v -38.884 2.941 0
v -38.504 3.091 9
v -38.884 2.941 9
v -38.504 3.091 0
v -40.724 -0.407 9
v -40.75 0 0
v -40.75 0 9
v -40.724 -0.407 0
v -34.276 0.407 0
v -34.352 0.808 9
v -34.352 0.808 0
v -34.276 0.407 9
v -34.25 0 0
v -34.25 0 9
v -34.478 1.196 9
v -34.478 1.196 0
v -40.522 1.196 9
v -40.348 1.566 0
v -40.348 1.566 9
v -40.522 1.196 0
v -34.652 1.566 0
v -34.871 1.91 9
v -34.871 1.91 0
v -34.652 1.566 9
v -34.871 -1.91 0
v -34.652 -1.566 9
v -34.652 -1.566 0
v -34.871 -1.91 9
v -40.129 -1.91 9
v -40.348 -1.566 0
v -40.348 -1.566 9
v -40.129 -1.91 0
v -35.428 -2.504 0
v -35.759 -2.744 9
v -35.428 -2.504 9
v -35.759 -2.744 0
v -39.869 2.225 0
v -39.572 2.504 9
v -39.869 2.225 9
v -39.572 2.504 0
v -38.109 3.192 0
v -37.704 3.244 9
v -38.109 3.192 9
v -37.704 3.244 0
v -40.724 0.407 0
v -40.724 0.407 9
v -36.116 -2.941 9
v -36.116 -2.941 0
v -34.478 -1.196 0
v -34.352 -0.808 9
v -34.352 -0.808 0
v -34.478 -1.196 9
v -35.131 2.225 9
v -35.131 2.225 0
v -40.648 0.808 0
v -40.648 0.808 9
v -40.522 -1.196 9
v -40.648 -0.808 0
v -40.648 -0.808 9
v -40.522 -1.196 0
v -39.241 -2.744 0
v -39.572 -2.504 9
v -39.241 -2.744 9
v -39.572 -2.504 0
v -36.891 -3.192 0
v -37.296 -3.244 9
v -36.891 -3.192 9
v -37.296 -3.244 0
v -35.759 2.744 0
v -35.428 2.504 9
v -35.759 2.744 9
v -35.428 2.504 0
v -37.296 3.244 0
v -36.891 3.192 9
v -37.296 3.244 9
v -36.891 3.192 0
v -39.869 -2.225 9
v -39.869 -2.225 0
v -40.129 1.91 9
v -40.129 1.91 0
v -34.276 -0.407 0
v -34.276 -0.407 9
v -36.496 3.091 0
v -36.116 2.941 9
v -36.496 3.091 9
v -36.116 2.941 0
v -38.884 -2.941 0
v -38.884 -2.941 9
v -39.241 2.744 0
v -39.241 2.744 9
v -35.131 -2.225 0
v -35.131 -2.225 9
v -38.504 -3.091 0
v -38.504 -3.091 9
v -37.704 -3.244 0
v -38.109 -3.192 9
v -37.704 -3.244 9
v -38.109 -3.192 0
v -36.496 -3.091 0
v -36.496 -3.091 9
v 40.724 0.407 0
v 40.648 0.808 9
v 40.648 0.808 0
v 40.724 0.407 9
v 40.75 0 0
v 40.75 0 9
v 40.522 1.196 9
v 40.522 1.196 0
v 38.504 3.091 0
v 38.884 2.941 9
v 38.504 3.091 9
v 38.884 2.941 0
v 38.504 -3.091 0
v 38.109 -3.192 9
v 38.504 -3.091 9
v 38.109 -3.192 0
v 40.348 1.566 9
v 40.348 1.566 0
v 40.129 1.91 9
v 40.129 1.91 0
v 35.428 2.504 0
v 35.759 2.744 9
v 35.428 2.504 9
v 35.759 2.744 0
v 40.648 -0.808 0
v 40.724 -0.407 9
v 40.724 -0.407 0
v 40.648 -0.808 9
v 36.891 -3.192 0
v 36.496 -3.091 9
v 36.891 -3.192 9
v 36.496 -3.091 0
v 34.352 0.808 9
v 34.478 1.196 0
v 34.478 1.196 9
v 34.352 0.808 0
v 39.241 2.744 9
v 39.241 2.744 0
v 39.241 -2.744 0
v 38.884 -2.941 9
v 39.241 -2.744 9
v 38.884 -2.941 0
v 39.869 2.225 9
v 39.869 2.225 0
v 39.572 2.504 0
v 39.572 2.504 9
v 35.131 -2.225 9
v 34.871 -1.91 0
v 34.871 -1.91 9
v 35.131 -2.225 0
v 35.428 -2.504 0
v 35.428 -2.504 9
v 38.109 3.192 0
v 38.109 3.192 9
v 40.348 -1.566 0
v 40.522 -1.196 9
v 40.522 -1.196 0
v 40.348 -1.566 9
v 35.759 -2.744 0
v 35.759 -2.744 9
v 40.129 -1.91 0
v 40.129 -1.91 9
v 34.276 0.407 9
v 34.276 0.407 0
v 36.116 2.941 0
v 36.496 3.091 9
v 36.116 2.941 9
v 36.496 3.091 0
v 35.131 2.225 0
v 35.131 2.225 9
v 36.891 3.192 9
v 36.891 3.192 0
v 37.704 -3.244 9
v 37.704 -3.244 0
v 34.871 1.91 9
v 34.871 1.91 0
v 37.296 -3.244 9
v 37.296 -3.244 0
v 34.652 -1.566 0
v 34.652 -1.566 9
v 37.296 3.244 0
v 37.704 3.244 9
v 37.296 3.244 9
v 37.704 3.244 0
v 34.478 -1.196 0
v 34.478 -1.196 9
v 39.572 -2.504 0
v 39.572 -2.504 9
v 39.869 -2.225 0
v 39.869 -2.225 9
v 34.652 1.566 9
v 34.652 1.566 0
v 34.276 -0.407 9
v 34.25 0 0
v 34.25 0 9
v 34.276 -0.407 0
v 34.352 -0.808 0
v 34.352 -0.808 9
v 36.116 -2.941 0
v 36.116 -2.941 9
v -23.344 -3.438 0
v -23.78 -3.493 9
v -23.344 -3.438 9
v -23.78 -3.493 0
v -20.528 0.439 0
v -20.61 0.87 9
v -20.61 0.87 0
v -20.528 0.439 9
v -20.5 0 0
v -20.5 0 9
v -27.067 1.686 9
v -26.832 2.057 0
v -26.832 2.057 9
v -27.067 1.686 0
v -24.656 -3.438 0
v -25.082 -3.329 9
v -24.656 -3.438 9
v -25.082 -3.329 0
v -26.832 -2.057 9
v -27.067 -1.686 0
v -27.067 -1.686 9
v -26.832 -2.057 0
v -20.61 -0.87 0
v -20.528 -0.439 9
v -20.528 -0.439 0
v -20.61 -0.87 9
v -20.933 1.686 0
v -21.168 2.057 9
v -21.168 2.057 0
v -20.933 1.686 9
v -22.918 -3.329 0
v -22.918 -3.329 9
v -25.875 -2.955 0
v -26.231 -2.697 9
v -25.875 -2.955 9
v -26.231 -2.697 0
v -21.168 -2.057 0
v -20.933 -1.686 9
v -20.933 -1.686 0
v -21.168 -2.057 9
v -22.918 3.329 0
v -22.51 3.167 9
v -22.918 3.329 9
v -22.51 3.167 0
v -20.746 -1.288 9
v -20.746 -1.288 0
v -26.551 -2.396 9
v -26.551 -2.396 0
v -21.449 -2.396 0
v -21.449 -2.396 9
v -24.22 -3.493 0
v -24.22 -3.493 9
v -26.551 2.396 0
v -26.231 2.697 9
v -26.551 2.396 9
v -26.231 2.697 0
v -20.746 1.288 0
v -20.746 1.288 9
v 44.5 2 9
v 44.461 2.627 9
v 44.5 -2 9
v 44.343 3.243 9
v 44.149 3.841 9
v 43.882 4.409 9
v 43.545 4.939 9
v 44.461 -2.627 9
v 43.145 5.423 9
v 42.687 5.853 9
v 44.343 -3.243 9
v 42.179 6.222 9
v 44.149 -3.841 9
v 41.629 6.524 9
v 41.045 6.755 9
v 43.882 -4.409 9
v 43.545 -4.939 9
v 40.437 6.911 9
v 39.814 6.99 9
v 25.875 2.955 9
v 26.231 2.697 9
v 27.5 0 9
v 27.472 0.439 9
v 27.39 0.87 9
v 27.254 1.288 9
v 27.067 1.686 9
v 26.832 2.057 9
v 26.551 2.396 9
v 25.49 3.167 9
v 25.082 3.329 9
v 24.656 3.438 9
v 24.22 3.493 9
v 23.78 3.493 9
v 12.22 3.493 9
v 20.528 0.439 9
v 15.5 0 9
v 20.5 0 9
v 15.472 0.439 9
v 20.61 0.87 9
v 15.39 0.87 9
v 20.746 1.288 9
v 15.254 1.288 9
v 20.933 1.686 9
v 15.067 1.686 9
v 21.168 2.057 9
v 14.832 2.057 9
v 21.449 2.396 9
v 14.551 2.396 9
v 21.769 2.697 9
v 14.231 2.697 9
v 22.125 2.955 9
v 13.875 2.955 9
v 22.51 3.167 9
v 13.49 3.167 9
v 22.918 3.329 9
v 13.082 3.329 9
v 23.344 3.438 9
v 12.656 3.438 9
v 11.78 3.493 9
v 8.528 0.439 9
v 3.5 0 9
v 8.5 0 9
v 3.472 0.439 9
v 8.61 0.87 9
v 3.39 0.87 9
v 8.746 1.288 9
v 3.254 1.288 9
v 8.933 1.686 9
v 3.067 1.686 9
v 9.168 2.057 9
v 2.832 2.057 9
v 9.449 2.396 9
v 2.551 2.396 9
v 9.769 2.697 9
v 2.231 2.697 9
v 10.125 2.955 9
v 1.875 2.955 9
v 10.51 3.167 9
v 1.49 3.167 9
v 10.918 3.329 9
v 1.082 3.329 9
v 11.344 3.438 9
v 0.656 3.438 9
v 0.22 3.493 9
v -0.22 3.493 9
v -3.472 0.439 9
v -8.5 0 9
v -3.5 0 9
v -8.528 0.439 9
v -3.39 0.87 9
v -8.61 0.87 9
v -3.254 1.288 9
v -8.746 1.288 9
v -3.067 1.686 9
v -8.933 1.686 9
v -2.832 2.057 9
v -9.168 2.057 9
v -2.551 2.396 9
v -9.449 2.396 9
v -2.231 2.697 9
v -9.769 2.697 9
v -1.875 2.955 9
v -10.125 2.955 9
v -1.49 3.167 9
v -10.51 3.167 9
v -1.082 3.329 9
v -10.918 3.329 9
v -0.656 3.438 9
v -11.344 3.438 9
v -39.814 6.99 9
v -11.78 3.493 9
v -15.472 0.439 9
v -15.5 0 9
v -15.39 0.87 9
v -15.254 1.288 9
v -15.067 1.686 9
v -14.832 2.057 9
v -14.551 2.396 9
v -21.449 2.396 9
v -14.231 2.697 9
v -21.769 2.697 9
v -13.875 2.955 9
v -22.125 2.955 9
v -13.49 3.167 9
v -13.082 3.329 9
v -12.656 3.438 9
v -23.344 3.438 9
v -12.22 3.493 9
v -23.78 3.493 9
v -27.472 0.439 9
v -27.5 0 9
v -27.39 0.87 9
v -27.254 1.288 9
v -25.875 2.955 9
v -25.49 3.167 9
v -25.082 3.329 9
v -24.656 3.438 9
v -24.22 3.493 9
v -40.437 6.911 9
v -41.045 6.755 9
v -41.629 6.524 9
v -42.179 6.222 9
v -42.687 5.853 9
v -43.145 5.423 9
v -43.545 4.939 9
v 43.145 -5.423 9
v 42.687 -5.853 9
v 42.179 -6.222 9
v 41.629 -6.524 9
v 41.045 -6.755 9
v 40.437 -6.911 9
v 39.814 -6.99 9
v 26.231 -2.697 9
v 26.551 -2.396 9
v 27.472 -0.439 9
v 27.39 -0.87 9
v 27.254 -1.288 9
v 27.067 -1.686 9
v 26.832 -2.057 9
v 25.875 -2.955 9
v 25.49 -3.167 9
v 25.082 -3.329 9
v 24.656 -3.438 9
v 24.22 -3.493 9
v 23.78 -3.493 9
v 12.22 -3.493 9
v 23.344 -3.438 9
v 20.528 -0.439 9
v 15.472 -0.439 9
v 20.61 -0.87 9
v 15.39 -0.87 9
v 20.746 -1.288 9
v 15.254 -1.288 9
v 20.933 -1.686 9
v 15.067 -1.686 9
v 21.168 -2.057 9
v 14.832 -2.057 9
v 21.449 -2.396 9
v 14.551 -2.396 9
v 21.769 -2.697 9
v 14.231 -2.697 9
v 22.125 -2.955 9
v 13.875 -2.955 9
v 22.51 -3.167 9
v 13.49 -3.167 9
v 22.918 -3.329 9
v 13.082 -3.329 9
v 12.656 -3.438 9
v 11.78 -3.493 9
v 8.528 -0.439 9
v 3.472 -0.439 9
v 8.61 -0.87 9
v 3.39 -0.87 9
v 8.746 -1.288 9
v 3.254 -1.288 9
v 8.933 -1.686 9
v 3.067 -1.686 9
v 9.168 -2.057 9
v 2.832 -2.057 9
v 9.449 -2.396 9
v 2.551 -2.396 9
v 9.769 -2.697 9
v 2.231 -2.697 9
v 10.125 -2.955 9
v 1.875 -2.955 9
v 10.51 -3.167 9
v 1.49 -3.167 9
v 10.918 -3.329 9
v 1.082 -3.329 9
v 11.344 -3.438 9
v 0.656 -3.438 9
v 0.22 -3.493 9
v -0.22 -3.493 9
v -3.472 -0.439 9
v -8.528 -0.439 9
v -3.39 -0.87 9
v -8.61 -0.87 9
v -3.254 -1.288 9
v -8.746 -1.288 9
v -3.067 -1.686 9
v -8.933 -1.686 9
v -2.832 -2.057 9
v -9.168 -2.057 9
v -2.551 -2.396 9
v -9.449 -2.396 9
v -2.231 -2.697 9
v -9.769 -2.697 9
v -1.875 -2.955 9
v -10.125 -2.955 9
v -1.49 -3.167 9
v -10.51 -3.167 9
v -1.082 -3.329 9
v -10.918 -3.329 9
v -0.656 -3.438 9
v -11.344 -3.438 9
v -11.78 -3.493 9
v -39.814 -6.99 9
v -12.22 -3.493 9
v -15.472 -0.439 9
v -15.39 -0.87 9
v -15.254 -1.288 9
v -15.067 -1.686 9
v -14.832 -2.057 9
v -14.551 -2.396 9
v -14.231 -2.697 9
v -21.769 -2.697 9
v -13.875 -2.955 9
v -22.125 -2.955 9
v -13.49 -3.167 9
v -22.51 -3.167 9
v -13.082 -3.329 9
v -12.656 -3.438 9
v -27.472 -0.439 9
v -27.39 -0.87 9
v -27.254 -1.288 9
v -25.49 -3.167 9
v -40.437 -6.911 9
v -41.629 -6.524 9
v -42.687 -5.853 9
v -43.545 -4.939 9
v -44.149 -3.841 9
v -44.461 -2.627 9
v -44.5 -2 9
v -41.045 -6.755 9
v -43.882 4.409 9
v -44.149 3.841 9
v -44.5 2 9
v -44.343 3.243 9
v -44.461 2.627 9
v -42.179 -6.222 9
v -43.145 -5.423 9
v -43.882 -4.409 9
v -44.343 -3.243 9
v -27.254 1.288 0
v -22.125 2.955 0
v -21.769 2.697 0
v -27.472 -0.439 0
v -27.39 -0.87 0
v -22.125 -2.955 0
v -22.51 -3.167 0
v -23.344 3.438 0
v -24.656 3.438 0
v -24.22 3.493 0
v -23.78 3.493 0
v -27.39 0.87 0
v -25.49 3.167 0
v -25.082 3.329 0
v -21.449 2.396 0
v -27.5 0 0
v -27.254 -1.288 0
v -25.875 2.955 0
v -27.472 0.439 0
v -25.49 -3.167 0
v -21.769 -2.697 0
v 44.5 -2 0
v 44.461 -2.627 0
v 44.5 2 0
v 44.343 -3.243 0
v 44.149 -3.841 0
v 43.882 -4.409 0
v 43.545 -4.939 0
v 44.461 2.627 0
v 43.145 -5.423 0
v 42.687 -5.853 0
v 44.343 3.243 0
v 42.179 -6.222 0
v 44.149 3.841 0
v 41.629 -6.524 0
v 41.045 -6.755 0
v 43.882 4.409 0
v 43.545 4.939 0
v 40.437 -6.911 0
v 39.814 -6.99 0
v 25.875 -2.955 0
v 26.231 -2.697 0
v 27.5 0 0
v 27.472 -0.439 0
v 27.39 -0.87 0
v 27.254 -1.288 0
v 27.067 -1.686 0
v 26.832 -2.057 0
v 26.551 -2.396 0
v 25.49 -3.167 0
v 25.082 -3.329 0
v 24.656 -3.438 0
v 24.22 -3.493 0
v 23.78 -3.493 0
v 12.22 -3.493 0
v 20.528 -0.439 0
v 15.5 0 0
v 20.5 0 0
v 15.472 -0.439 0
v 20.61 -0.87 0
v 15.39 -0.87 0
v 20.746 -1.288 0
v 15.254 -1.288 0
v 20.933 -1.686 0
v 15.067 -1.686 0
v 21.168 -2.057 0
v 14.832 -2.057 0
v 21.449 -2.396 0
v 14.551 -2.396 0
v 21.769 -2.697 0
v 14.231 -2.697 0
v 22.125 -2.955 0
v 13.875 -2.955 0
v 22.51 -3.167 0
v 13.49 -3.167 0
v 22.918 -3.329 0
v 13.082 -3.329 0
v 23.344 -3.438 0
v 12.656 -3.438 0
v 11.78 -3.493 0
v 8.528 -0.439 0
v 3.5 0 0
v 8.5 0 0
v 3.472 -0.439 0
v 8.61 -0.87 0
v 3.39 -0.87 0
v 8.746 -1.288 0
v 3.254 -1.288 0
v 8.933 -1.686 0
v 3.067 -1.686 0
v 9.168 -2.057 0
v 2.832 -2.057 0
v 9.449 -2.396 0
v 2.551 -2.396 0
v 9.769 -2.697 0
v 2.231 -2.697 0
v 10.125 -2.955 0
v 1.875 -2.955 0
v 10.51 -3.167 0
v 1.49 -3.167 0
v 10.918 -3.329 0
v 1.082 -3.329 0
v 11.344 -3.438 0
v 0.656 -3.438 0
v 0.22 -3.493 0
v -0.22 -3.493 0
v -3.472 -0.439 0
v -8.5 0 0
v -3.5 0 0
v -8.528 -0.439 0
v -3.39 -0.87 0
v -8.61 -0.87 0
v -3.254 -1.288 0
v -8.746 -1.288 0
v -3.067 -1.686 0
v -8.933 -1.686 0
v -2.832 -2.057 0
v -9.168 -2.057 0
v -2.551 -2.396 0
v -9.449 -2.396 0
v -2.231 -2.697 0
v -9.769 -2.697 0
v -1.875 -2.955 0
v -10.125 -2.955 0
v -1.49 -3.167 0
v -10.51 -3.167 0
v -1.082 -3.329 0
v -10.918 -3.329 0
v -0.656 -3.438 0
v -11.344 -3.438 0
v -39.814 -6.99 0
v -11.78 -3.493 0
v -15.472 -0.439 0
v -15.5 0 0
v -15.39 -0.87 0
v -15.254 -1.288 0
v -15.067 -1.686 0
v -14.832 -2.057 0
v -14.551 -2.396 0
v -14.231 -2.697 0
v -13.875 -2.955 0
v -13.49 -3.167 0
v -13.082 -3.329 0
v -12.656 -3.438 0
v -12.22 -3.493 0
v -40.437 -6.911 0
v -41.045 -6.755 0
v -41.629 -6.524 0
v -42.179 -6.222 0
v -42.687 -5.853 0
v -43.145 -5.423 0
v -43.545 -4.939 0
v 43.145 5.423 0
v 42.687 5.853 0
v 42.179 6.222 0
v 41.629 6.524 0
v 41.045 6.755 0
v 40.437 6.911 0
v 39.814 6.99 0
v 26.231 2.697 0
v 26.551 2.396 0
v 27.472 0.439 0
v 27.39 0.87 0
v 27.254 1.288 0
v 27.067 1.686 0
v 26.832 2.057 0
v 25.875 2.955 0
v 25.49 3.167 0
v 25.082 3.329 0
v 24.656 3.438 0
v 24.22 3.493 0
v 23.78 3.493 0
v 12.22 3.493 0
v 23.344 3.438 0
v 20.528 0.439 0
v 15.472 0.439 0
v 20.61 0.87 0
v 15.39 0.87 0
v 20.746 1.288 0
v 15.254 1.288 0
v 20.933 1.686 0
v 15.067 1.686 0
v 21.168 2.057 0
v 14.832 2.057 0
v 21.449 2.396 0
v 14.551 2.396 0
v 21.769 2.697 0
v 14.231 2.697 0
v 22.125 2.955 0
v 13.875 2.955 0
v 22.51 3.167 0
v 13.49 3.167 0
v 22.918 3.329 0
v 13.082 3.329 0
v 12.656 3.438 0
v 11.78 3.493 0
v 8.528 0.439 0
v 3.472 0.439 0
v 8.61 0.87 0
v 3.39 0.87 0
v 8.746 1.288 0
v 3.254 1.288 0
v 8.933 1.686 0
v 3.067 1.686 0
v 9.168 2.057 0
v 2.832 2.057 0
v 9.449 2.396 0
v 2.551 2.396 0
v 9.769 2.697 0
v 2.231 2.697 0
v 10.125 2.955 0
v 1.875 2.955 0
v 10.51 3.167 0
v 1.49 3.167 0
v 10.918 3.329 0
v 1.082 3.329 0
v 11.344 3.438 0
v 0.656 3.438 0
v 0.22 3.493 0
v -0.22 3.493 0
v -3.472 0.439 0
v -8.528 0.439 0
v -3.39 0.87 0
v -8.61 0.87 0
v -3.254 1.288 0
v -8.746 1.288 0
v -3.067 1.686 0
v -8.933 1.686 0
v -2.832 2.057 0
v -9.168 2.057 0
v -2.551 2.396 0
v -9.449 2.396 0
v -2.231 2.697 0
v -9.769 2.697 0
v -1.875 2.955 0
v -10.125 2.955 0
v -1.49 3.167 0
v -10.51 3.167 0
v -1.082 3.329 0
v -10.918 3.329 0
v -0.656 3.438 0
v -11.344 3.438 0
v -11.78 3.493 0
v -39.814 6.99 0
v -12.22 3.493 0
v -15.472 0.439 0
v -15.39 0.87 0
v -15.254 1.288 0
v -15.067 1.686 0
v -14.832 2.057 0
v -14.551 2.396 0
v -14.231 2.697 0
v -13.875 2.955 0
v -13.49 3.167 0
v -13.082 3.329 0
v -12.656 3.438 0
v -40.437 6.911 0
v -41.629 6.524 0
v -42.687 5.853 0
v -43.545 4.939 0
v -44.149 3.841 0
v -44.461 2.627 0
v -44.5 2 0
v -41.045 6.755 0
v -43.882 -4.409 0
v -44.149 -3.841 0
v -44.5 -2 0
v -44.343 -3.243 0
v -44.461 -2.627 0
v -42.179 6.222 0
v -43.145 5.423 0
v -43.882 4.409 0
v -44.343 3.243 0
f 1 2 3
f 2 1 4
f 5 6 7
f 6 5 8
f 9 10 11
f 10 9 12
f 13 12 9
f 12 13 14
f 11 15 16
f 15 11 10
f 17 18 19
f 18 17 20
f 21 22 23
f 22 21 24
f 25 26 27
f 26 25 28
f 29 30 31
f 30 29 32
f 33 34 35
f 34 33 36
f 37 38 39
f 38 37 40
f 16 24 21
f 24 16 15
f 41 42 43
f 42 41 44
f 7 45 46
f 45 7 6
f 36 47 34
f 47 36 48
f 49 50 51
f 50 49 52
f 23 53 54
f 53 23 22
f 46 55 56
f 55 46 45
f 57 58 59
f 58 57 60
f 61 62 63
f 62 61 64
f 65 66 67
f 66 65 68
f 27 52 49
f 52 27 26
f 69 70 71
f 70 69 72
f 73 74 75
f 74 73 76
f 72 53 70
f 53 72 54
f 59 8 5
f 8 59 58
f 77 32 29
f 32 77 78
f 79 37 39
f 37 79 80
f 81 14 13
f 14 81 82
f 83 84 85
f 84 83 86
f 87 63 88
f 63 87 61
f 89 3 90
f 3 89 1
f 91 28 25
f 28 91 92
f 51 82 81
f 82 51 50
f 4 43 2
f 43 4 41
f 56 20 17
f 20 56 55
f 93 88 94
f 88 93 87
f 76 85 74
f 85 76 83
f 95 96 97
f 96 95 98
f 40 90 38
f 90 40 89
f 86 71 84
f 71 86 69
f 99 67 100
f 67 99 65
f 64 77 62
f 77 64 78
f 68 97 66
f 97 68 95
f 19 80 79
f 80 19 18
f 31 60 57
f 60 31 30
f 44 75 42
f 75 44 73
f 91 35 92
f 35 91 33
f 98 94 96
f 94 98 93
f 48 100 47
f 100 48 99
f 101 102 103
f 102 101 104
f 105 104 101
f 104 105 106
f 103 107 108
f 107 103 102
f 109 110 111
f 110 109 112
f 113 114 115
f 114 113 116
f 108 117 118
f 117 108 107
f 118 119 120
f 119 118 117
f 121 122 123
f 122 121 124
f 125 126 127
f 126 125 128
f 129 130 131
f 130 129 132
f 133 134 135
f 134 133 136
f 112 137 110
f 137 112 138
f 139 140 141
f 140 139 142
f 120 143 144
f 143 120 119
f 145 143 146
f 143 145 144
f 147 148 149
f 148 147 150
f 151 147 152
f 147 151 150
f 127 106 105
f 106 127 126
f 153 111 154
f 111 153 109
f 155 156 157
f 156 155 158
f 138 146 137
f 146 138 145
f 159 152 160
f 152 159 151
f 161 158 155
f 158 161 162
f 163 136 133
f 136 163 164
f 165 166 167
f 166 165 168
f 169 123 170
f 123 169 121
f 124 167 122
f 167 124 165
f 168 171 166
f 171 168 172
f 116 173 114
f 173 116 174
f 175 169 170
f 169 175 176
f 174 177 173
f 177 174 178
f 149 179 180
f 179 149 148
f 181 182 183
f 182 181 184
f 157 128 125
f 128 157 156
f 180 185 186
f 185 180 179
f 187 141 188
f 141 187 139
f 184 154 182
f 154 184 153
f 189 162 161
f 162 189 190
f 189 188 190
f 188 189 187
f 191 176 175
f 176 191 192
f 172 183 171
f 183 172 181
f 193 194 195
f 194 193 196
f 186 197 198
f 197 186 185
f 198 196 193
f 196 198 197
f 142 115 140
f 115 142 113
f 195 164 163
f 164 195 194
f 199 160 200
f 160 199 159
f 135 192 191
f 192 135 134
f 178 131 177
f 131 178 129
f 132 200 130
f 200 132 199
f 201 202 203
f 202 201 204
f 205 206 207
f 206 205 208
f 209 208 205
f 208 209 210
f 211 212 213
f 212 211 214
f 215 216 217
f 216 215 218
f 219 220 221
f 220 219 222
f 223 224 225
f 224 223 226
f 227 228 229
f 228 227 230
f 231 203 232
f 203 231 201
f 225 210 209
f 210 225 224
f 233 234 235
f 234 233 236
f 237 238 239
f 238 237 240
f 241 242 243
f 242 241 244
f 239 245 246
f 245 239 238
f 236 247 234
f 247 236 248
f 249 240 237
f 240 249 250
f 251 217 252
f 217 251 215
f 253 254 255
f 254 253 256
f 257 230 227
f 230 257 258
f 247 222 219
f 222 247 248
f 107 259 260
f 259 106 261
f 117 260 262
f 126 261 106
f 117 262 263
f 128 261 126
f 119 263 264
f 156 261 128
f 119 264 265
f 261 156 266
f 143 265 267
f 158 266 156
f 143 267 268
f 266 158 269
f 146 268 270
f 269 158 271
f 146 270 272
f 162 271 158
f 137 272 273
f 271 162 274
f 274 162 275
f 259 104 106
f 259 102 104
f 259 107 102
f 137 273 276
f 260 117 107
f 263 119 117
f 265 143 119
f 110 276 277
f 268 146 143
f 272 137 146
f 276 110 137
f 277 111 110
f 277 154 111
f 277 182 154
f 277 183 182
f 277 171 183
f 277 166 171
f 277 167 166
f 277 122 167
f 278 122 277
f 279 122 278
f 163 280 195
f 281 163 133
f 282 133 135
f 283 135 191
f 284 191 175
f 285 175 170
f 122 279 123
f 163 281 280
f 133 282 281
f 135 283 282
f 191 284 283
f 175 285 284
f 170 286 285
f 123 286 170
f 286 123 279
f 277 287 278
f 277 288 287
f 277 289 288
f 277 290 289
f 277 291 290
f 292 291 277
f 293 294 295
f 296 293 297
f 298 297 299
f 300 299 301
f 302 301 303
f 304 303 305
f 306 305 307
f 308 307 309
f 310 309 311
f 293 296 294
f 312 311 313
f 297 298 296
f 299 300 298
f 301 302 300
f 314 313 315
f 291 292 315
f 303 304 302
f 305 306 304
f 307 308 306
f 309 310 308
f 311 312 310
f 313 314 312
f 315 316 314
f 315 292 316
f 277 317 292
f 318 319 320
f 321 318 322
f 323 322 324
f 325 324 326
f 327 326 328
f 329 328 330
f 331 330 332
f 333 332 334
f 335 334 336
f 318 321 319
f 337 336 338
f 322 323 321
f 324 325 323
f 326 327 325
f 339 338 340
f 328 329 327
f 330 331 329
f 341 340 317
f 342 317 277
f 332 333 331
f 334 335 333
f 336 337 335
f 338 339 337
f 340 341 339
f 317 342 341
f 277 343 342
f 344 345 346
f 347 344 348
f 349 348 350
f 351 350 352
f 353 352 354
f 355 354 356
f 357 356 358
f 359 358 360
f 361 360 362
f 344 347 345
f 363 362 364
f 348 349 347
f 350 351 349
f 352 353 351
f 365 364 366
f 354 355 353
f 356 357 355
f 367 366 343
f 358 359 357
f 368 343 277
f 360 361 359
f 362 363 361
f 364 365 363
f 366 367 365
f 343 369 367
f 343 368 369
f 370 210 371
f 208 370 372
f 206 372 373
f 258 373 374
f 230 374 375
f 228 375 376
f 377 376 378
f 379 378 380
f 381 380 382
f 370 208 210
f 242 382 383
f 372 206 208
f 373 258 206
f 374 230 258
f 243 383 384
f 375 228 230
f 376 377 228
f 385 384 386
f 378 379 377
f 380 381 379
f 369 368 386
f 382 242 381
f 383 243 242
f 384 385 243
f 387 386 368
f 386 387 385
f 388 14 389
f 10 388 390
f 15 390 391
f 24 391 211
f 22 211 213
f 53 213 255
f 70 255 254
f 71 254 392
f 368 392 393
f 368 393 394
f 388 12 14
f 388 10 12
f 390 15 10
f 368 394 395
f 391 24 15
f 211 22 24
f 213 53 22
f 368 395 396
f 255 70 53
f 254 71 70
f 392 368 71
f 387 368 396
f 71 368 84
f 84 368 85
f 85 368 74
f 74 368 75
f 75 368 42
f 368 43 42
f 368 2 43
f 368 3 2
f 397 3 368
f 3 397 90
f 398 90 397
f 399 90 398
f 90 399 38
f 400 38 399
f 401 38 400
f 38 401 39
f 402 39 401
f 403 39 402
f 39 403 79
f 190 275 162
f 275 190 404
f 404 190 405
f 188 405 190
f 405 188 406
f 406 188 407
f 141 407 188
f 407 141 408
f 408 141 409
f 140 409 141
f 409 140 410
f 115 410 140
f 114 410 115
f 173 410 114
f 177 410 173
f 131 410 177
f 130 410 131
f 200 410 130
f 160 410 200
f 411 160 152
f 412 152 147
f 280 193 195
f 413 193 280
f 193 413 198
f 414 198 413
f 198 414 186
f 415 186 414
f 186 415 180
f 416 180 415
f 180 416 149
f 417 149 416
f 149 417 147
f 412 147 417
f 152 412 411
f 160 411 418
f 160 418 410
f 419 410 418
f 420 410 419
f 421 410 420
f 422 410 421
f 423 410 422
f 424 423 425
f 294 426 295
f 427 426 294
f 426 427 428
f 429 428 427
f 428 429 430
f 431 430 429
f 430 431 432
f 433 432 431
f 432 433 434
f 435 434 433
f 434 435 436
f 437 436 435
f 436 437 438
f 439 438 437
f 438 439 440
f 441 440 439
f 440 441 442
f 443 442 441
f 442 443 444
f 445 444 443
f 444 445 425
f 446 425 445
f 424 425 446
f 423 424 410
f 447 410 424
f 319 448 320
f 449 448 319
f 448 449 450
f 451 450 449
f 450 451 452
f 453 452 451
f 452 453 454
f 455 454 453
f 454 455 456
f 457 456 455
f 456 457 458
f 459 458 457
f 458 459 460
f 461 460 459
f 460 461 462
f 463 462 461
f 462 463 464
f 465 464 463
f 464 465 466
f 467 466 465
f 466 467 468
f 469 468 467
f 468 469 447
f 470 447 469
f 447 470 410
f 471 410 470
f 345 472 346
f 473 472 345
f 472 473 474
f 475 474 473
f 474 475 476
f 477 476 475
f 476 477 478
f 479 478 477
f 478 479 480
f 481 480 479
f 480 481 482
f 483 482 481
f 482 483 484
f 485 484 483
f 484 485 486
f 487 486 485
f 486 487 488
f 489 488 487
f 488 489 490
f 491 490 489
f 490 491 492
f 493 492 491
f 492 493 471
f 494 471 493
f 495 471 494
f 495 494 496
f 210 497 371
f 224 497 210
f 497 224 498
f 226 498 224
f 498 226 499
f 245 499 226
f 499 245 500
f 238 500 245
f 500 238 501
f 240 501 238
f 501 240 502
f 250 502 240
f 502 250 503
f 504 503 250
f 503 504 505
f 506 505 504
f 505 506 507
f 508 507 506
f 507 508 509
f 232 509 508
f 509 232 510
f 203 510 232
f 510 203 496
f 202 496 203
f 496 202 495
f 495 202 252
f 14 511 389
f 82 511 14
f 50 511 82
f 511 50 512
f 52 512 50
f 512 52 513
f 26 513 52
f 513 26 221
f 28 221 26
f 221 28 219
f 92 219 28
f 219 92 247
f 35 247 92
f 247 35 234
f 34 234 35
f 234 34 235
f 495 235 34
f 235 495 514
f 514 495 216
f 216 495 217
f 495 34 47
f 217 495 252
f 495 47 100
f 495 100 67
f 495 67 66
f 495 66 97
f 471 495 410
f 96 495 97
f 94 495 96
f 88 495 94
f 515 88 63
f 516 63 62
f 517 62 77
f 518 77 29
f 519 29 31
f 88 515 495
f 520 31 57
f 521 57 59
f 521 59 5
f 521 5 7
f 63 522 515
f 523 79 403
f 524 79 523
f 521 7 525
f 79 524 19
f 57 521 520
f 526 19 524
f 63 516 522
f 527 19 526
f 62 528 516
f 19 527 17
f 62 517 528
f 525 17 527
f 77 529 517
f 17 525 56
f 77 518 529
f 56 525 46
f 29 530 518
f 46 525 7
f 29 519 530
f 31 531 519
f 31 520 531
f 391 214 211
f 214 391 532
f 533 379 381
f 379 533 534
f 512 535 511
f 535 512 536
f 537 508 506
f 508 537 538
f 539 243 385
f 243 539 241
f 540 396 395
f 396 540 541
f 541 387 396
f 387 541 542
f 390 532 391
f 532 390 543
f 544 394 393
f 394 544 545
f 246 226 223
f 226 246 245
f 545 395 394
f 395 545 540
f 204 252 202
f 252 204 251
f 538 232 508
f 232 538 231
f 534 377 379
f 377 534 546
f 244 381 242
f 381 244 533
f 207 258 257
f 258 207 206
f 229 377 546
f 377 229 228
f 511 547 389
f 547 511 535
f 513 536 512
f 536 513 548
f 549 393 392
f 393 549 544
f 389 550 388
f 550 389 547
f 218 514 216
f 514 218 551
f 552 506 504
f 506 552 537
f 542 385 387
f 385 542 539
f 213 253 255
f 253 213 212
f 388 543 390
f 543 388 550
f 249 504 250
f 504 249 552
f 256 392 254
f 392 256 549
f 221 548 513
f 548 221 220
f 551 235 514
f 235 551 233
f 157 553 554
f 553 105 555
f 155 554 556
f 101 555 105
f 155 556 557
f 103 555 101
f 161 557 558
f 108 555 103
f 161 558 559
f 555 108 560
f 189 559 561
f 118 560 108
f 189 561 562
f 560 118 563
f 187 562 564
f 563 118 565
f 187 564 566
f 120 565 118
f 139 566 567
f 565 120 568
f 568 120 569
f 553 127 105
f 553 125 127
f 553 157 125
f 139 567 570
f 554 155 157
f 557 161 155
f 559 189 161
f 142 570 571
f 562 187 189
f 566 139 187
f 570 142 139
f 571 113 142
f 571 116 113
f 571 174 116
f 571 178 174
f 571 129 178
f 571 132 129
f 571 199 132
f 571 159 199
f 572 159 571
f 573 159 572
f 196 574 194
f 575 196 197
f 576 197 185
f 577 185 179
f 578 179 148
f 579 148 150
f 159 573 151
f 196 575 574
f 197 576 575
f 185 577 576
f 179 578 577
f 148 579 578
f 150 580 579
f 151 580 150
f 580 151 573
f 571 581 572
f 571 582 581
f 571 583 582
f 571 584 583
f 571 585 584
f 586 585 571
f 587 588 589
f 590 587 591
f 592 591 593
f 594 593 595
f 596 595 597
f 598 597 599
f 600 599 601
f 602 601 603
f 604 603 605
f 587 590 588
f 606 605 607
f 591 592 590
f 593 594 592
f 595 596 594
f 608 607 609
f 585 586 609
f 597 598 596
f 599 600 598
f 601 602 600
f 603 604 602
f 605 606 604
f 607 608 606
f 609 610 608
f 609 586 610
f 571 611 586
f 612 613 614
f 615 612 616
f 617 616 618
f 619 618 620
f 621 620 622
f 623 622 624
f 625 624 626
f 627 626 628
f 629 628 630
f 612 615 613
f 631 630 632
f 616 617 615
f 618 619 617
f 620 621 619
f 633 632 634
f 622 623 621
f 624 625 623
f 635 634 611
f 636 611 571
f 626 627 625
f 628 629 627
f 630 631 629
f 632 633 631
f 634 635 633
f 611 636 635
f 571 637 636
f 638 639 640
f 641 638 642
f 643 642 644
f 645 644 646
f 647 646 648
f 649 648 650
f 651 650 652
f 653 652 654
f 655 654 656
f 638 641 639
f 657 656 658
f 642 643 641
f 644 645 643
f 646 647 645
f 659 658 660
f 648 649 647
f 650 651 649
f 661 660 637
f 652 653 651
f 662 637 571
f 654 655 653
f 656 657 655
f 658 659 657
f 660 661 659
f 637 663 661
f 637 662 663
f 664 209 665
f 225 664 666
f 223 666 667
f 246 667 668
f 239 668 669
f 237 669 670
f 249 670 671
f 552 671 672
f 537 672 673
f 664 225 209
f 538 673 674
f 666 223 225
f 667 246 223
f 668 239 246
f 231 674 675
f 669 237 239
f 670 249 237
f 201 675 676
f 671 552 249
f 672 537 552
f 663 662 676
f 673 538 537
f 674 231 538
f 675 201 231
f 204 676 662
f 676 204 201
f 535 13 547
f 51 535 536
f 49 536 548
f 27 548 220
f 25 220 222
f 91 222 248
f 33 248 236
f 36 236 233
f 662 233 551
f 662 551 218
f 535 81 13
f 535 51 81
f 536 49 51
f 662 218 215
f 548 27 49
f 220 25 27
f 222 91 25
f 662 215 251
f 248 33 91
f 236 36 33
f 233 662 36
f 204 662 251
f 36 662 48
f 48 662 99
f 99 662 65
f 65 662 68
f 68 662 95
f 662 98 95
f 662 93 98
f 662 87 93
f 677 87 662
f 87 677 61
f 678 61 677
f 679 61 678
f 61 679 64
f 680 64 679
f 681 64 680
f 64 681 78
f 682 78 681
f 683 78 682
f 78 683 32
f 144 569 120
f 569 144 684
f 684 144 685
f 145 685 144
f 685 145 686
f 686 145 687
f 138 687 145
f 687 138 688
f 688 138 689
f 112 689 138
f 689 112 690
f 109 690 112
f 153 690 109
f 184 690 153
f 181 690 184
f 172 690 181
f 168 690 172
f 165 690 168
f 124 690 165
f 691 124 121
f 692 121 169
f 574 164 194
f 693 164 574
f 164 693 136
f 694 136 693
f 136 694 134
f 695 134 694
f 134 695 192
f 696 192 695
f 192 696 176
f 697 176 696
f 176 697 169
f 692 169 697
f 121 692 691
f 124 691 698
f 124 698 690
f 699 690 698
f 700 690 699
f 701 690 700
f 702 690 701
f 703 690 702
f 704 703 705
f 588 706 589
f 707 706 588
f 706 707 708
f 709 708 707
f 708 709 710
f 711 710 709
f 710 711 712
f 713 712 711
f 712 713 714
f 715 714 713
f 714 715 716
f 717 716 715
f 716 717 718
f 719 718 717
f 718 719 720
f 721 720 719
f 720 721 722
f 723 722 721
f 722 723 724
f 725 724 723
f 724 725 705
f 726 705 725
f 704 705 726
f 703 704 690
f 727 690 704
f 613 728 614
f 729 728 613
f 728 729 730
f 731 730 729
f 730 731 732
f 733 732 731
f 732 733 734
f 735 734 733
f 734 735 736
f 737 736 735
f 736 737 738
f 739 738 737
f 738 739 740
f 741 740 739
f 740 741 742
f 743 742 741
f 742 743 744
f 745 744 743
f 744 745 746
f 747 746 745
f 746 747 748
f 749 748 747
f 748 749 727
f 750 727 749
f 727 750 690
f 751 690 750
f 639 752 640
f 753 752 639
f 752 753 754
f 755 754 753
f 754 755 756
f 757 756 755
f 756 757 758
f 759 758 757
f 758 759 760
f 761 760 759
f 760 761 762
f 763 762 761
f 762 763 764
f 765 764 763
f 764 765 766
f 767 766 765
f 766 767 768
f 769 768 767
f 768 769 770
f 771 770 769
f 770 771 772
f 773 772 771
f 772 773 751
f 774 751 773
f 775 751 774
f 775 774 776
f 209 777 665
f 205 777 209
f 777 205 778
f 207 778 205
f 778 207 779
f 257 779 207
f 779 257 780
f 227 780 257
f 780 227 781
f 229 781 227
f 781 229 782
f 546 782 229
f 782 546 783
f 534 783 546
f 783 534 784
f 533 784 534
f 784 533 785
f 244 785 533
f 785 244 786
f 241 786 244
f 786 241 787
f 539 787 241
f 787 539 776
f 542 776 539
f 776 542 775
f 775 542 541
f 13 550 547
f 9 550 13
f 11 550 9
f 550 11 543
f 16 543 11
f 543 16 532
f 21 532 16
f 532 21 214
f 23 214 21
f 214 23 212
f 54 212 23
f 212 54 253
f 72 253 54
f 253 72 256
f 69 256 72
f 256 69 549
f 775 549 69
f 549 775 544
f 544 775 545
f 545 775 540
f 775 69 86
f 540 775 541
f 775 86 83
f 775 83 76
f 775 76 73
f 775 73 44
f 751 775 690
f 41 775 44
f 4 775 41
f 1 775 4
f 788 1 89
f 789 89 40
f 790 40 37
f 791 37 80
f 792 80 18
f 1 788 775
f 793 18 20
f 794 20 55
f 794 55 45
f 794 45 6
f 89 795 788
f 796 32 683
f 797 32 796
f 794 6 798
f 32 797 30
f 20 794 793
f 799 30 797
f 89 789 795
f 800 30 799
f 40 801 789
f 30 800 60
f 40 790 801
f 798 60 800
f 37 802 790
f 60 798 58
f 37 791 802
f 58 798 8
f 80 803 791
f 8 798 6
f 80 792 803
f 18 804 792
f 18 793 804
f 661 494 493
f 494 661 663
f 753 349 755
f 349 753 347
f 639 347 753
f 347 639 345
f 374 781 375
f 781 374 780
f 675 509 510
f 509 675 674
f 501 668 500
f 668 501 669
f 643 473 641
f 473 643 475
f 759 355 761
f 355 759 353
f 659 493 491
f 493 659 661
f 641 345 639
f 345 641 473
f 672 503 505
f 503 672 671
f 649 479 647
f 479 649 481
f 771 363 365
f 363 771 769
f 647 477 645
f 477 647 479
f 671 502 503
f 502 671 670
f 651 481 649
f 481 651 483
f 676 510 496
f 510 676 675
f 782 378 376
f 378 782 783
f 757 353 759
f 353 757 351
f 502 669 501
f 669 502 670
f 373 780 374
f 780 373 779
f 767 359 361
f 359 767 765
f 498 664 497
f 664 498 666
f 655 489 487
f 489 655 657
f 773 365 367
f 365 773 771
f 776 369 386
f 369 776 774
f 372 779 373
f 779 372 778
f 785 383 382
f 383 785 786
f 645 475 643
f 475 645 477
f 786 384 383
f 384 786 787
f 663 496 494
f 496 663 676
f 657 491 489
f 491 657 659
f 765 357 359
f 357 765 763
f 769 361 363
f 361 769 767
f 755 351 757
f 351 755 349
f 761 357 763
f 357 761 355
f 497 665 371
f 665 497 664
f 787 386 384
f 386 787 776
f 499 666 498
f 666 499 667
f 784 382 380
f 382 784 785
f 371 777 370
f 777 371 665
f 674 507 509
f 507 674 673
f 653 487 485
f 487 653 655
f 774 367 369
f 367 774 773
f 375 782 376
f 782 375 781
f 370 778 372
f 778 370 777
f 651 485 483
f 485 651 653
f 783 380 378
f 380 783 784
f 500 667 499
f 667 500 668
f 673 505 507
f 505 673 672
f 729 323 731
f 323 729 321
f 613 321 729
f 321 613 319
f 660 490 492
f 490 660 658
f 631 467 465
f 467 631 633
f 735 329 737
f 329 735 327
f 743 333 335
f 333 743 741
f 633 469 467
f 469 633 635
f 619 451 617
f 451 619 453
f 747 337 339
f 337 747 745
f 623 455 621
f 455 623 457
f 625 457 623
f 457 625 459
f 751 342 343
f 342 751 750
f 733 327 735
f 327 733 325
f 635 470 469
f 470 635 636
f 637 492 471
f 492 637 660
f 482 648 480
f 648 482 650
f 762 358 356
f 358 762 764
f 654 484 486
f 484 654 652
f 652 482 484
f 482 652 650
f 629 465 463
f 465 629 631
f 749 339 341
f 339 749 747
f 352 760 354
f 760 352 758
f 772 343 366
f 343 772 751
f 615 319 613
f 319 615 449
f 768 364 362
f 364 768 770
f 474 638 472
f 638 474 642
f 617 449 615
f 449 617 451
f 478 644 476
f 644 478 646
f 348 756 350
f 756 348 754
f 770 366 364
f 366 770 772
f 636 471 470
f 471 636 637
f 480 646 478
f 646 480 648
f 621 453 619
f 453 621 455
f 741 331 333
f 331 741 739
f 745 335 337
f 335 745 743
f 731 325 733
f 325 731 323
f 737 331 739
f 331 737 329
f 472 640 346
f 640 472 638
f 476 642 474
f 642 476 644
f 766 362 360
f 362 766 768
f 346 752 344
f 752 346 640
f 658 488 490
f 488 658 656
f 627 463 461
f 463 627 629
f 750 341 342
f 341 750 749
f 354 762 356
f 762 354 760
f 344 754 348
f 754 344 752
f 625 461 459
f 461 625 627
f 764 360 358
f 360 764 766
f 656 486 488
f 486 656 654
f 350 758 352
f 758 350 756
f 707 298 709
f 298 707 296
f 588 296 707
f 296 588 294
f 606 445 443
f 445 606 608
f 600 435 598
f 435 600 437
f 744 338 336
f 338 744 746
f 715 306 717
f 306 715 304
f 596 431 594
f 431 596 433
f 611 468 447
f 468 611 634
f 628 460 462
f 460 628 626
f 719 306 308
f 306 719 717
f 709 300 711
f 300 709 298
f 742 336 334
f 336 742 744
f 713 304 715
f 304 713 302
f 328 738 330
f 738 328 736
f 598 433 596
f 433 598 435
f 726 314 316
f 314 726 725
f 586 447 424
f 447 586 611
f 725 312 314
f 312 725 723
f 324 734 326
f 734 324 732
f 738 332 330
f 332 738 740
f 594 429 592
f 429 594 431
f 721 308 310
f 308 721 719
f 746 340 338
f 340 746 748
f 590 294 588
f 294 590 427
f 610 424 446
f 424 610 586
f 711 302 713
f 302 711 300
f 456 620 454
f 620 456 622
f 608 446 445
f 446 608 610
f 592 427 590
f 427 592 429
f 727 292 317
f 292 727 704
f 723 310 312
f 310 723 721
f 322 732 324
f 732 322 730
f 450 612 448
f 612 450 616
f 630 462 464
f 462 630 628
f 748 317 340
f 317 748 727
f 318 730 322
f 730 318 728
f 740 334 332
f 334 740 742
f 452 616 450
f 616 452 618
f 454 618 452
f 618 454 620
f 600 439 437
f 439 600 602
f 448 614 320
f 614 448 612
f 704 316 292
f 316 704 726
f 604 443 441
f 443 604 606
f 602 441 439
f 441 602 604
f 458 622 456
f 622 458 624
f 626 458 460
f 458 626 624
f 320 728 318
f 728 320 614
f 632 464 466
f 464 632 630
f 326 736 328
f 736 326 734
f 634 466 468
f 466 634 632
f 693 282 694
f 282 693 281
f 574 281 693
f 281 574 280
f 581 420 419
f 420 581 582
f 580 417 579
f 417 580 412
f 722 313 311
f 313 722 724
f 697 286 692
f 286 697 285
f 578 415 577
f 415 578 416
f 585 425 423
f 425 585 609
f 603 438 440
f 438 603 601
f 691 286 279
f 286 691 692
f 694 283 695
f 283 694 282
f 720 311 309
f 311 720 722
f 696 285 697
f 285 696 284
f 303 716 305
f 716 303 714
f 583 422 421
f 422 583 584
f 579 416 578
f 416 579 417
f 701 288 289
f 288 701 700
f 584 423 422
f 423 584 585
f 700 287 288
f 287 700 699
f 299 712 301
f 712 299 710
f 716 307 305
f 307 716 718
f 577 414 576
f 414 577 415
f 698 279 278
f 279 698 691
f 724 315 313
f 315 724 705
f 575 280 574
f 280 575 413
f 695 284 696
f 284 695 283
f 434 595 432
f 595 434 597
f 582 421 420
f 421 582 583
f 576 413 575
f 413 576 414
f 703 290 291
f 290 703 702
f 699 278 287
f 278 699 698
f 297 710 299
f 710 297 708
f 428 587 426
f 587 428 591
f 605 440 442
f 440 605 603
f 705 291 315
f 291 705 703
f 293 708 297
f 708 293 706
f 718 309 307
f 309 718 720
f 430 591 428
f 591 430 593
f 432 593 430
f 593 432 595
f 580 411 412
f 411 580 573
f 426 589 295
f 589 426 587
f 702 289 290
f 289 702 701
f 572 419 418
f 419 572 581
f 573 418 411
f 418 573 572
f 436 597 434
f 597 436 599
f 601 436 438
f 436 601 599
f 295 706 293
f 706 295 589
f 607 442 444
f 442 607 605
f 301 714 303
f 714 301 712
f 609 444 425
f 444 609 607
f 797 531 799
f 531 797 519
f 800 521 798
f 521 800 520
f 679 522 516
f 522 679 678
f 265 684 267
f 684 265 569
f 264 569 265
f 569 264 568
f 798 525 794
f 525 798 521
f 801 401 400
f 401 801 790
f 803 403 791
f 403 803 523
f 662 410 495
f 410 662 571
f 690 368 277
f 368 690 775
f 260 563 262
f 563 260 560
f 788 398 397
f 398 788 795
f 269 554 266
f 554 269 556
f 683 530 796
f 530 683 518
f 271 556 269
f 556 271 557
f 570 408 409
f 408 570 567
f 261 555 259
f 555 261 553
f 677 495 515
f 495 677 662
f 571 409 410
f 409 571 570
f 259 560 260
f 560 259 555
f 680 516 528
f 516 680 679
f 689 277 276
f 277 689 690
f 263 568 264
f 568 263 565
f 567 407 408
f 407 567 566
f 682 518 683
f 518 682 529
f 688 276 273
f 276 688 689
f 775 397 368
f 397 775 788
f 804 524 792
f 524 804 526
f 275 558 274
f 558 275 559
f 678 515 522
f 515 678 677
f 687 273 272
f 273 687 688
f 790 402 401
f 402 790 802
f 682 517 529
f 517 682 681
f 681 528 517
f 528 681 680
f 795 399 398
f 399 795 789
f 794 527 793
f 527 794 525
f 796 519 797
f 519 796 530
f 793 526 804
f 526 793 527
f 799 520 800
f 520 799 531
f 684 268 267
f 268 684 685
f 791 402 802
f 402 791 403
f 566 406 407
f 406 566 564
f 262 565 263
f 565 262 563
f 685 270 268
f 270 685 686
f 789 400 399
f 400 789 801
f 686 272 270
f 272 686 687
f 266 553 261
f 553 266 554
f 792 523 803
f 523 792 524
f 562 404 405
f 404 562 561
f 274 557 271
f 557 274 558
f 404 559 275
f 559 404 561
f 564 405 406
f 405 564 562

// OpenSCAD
$fn = 50;


difference() {
	union() {
		hull() {
			translate(v = [-39.5000000000, 2.0000000000, 0]) {
				cylinder(h = 9, r = 5);
			}
			translate(v = [39.5000000000, 2.0000000000, 0]) {
				cylinder(h = 9, r = 5);
			}
			translate(v = [-39.5000000000, -2.0000000000, 0]) {
				cylinder(h = 9, r = 5);
			}
			translate(v = [39.5000000000, -2.0000000000, 0]) {
				cylinder(h = 9, r = 5);
			}
		}
	}
	union() {
		#translate(v = [-37.5000000000, 0.0000000000, 0]) {
			cylinder(h = 9, r = 3.2500000000);
		}
		#translate(v = [37.5000000000, 0.0000000000, 0]) {
			cylinder(h = 9, r = 3.2500000000);
		}
		#translate(v = [-37.5000000000, 0.0000000000, -100.0000000000]) {
			cylinder(h = 200, r = 3.2500000000);
		}
		#translate(v = [-37.5000000000, 0.0000000000, -100.0000000000]) {
			cylinder(h = 200, r = 3.2500000000);
		}
		#translate(v = [37.5000000000, 0.0000000000, -100.0000000000]) {
			cylinder(h = 200, r = 3.2500000000);
		}
		#translate(v = [37.5000000000, 0.0000000000, -100.0000000000]) {
			cylinder(h = 200, r = 3.2500000000);
		}
		#translate(v = [-37.5000000000, 0.0000000000, 0]) {
			cylinder(h = 9, r = 1.8000000000);
		}
		#translate(v = [37.5000000000, 0.0000000000, 0]) {
			cylinder(h = 9, r = 1.8000000000);
		}
		#translate(v = [-37.5000000000, 0.0000000000, 0]) {
			cylinder(h = 9, r = 1.8000000000);
		}
		#translate(v = [37.5000000000, 0.0000000000, 0]) {
			cylinder(h = 9, r = 1.8000000000);
		}
		#translate(v = [-37.5000000000, 0.0000000000, 0]) {
			cylinder(h = 9, r = 1.8000000000);
		}
		#translate(v = [37.5000000000, 0.0000000000, 0]) {
			cylinder(h = 9, r = 1.8000000000);
		}
		#translate(v = [-24.0000000000, 0, 0]) {
			cylinder(h = 9, r = 3.5000000000);
		}
		#translate(v = [-12.0000000000, 0, 0]) {
			cylinder(h = 9, r = 3.5000000000);
		}
		#cylinder(h = 9, r = 3.5000000000);
		#translate(v = [12.0000000000, 0, 0]) {
			cylinder(h = 9, r = 3.5000000000);
		}
		#translate(v = [24.0000000000, 0, 0]) {
			cylinder(h = 9, r = 3.5000000000);
		}
	}
}
